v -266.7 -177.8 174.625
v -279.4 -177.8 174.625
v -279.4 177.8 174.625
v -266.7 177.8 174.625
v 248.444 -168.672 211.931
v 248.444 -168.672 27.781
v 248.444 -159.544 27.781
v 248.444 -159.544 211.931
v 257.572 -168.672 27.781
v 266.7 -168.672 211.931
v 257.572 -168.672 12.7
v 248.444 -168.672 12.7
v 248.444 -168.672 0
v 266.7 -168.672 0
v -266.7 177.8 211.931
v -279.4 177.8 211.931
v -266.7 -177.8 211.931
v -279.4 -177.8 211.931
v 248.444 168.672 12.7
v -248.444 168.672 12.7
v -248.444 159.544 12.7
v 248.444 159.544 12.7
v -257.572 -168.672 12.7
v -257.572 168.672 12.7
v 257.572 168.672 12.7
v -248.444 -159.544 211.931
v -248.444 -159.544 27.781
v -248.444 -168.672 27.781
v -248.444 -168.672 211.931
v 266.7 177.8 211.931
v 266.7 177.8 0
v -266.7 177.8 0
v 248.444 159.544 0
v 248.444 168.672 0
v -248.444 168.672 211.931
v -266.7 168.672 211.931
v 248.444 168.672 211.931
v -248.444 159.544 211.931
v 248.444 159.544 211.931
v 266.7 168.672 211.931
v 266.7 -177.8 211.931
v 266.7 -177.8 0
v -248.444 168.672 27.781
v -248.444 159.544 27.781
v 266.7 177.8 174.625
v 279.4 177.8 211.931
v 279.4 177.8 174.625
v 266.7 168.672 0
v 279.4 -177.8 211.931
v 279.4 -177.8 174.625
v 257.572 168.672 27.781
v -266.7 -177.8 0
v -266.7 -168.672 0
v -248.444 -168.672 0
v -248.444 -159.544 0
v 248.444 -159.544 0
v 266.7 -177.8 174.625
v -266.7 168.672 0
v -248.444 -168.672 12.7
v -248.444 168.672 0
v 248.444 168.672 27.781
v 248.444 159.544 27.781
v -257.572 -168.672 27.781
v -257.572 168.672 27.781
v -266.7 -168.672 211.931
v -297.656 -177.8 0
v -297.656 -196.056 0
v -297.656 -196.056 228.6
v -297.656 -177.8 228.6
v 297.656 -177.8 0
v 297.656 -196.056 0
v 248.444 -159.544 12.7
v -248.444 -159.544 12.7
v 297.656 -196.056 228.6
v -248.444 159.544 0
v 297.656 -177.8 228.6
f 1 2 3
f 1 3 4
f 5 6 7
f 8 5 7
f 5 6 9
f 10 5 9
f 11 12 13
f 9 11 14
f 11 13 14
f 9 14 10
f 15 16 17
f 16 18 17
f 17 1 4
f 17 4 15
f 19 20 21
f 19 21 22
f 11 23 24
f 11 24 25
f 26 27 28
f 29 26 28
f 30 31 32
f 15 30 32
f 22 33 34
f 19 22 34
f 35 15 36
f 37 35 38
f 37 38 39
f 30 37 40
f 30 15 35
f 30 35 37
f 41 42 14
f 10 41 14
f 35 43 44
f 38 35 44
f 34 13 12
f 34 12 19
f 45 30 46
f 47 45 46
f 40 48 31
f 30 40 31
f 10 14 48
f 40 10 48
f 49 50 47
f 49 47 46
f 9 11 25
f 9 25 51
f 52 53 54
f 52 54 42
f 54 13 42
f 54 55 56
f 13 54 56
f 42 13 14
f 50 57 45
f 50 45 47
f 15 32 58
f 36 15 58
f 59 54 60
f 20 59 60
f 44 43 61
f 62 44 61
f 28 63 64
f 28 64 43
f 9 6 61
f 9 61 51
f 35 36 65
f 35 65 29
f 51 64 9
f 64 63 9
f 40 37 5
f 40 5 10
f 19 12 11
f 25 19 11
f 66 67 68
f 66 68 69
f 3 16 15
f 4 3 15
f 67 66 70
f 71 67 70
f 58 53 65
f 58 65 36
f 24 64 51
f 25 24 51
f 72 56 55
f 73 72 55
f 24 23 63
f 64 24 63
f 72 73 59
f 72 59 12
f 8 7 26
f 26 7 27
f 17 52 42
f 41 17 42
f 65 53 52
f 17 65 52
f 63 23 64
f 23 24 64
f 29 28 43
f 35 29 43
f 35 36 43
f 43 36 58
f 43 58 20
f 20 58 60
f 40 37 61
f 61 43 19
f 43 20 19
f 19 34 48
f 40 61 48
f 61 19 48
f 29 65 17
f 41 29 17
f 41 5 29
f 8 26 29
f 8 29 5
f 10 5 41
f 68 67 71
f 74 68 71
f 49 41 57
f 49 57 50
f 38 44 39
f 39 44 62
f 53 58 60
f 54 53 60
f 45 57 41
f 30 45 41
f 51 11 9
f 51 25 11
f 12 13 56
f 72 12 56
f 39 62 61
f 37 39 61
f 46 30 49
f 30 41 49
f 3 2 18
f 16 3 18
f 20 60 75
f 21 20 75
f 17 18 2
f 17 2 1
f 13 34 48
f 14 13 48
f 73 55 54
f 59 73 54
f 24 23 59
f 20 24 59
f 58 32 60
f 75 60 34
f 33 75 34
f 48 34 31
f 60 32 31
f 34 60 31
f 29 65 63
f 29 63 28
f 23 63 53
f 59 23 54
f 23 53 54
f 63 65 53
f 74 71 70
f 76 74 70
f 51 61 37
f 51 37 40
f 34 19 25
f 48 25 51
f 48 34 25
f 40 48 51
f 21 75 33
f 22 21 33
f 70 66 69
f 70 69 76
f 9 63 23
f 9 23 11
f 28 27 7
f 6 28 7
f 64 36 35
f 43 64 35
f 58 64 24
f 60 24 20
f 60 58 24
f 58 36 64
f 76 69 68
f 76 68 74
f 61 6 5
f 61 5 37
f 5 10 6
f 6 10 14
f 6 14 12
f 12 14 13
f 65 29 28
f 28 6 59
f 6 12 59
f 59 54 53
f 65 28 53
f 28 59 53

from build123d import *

# Parameters (mm, degrees)
F5_DEPTH       = 211.93125
F1_W           = 18.25625
F1_H           = 337.34375
F6_DEPTH       = 211.93125
F2_W           = 595.3125
F2_H           = 18.25625
F7_DEPTH       = 228.6
F3_W           = 515.14375
F3_H           = 15.08125
F8_DEPTH       = 168.671875
F8_DEPTH_BACK  = 168.671875
F9_DEPTH       = 168.671875
F9_DEPTH_BACK  = 168.671875
F4_W           = 12.7
F4_H           = 37.30625
F10_DEPTH      = 177.8
F10_DEPTH_BACK = 177.8


with BuildPart() as f5:
    # F0 (on Top) → F5 (new body)
    with BuildSketch(Plane.XY):
        Polygon((266.7, 177.8), (-266.7, 177.8), (-266.7, 168.671875), (-248.44375, 168.671875), (-248.44375, 159.54375), (248.44375, 159.54375), (248.44375, 168.671875), (266.7, 168.671875), align=None)
    extrude(amount=F5_DEPTH)


with BuildPart() as f5b:
    # F0 (on Top) → F5, piece 2 (new body)
    with BuildSketch(Plane.XY):
        Polygon((-266.7, -177.8), (266.7, -177.8), (266.7, -168.671875), (248.44375, -168.671875), (248.44375, -159.54375), (-248.44375, -159.54375), (-248.44375, -168.671875), (-266.7, -168.671875), align=None)
    extrude(amount=F5_DEPTH)


with BuildPart() as f6:
    # F1 (on Top) → F6 (new body, through all)
    with BuildSketch(Plane.XY):
        with Locations((-257.571875, 0)):
            Rectangle(F1_W, F1_H)
    extrude(amount=F6_DEPTH)


with BuildPart() as f6b:
    # F1 (on Top) → F6, piece 2 (new body, through all)
    with BuildSketch(Plane.XY):
        with Locations((257.571875, 0)):
            Rectangle(F1_W, F1_H)
    extrude(amount=F6_DEPTH)


with BuildPart() as f7:
    # F2 (on Top) → F7 (new body)
    with BuildSketch(Plane.XY):
        with Locations((0, -186.928125)):
            Rectangle(F2_W, F2_H)
    extrude(amount=F7_DEPTH)


with BuildPart() as f8_tool:
    # F3 (on Front) → F8 (new body, two sides)
    with BuildSketch(Plane.XZ) as f8_sk:
        with Locations((0, 20.240625)):
            Rectangle(F3_W, F3_H)
    extrude(amount=-F8_DEPTH)
    extrude(f8_sk.sketch, amount=F8_DEPTH_BACK)


with BuildPart() as f5_1:
    add(f5.part)

    # F8: cut by f8_tool
    add(f8_tool.part, mode=Mode.SUBTRACT)


with BuildPart() as f5b_1:
    add(f5b.part)

    # F8: cut by f8_tool
    add(f8_tool.part, mode=Mode.SUBTRACT)


with BuildPart() as f6_1:
    add(f6.part)

    # F8: cut by f8_tool
    add(f8_tool.part, mode=Mode.SUBTRACT)


with BuildPart() as f6b_1:
    add(f6b.part)

    # F8: cut by f8_tool
    add(f8_tool.part, mode=Mode.SUBTRACT)


with BuildPart() as f9:
    # F3 (on Front) → F9 (new body, two sides)
    with BuildSketch(Plane.XZ) as f9_sk:
        with Locations((0, 20.240625)):
            Rectangle(F3_W, F3_H)
    extrude(amount=F9_DEPTH)
    extrude(f9_sk.sketch, amount=-F9_DEPTH_BACK)


with BuildPart() as f10:
    # F4 (on Front) → F10 (new body, two sides)
    with BuildSketch(Plane.XZ) as f10_sk:
        with Locations((-273.05, 193.278125)):
            Rectangle(F4_W, F4_H)
    extrude(amount=F10_DEPTH)
    extrude(f10_sk.sketch, amount=-F10_DEPTH_BACK)


with BuildPart() as f10b:
    # F4 (on Front) → F10, piece 2 (new body, two sides)
    with BuildSketch(Plane.XZ) as f10_2_sk:
        with Locations((273.05, 193.278125)):
            Rectangle(F4_W, F4_H)
    extrude(amount=F10_DEPTH)
    extrude(f10_2_sk.sketch, amount=-F10_DEPTH_BACK)


solid = Compound([f7.part, f5_1.part, f5b_1.part, f6_1.part, f6b_1.part, f9.part, f10.part, f10b.part])
